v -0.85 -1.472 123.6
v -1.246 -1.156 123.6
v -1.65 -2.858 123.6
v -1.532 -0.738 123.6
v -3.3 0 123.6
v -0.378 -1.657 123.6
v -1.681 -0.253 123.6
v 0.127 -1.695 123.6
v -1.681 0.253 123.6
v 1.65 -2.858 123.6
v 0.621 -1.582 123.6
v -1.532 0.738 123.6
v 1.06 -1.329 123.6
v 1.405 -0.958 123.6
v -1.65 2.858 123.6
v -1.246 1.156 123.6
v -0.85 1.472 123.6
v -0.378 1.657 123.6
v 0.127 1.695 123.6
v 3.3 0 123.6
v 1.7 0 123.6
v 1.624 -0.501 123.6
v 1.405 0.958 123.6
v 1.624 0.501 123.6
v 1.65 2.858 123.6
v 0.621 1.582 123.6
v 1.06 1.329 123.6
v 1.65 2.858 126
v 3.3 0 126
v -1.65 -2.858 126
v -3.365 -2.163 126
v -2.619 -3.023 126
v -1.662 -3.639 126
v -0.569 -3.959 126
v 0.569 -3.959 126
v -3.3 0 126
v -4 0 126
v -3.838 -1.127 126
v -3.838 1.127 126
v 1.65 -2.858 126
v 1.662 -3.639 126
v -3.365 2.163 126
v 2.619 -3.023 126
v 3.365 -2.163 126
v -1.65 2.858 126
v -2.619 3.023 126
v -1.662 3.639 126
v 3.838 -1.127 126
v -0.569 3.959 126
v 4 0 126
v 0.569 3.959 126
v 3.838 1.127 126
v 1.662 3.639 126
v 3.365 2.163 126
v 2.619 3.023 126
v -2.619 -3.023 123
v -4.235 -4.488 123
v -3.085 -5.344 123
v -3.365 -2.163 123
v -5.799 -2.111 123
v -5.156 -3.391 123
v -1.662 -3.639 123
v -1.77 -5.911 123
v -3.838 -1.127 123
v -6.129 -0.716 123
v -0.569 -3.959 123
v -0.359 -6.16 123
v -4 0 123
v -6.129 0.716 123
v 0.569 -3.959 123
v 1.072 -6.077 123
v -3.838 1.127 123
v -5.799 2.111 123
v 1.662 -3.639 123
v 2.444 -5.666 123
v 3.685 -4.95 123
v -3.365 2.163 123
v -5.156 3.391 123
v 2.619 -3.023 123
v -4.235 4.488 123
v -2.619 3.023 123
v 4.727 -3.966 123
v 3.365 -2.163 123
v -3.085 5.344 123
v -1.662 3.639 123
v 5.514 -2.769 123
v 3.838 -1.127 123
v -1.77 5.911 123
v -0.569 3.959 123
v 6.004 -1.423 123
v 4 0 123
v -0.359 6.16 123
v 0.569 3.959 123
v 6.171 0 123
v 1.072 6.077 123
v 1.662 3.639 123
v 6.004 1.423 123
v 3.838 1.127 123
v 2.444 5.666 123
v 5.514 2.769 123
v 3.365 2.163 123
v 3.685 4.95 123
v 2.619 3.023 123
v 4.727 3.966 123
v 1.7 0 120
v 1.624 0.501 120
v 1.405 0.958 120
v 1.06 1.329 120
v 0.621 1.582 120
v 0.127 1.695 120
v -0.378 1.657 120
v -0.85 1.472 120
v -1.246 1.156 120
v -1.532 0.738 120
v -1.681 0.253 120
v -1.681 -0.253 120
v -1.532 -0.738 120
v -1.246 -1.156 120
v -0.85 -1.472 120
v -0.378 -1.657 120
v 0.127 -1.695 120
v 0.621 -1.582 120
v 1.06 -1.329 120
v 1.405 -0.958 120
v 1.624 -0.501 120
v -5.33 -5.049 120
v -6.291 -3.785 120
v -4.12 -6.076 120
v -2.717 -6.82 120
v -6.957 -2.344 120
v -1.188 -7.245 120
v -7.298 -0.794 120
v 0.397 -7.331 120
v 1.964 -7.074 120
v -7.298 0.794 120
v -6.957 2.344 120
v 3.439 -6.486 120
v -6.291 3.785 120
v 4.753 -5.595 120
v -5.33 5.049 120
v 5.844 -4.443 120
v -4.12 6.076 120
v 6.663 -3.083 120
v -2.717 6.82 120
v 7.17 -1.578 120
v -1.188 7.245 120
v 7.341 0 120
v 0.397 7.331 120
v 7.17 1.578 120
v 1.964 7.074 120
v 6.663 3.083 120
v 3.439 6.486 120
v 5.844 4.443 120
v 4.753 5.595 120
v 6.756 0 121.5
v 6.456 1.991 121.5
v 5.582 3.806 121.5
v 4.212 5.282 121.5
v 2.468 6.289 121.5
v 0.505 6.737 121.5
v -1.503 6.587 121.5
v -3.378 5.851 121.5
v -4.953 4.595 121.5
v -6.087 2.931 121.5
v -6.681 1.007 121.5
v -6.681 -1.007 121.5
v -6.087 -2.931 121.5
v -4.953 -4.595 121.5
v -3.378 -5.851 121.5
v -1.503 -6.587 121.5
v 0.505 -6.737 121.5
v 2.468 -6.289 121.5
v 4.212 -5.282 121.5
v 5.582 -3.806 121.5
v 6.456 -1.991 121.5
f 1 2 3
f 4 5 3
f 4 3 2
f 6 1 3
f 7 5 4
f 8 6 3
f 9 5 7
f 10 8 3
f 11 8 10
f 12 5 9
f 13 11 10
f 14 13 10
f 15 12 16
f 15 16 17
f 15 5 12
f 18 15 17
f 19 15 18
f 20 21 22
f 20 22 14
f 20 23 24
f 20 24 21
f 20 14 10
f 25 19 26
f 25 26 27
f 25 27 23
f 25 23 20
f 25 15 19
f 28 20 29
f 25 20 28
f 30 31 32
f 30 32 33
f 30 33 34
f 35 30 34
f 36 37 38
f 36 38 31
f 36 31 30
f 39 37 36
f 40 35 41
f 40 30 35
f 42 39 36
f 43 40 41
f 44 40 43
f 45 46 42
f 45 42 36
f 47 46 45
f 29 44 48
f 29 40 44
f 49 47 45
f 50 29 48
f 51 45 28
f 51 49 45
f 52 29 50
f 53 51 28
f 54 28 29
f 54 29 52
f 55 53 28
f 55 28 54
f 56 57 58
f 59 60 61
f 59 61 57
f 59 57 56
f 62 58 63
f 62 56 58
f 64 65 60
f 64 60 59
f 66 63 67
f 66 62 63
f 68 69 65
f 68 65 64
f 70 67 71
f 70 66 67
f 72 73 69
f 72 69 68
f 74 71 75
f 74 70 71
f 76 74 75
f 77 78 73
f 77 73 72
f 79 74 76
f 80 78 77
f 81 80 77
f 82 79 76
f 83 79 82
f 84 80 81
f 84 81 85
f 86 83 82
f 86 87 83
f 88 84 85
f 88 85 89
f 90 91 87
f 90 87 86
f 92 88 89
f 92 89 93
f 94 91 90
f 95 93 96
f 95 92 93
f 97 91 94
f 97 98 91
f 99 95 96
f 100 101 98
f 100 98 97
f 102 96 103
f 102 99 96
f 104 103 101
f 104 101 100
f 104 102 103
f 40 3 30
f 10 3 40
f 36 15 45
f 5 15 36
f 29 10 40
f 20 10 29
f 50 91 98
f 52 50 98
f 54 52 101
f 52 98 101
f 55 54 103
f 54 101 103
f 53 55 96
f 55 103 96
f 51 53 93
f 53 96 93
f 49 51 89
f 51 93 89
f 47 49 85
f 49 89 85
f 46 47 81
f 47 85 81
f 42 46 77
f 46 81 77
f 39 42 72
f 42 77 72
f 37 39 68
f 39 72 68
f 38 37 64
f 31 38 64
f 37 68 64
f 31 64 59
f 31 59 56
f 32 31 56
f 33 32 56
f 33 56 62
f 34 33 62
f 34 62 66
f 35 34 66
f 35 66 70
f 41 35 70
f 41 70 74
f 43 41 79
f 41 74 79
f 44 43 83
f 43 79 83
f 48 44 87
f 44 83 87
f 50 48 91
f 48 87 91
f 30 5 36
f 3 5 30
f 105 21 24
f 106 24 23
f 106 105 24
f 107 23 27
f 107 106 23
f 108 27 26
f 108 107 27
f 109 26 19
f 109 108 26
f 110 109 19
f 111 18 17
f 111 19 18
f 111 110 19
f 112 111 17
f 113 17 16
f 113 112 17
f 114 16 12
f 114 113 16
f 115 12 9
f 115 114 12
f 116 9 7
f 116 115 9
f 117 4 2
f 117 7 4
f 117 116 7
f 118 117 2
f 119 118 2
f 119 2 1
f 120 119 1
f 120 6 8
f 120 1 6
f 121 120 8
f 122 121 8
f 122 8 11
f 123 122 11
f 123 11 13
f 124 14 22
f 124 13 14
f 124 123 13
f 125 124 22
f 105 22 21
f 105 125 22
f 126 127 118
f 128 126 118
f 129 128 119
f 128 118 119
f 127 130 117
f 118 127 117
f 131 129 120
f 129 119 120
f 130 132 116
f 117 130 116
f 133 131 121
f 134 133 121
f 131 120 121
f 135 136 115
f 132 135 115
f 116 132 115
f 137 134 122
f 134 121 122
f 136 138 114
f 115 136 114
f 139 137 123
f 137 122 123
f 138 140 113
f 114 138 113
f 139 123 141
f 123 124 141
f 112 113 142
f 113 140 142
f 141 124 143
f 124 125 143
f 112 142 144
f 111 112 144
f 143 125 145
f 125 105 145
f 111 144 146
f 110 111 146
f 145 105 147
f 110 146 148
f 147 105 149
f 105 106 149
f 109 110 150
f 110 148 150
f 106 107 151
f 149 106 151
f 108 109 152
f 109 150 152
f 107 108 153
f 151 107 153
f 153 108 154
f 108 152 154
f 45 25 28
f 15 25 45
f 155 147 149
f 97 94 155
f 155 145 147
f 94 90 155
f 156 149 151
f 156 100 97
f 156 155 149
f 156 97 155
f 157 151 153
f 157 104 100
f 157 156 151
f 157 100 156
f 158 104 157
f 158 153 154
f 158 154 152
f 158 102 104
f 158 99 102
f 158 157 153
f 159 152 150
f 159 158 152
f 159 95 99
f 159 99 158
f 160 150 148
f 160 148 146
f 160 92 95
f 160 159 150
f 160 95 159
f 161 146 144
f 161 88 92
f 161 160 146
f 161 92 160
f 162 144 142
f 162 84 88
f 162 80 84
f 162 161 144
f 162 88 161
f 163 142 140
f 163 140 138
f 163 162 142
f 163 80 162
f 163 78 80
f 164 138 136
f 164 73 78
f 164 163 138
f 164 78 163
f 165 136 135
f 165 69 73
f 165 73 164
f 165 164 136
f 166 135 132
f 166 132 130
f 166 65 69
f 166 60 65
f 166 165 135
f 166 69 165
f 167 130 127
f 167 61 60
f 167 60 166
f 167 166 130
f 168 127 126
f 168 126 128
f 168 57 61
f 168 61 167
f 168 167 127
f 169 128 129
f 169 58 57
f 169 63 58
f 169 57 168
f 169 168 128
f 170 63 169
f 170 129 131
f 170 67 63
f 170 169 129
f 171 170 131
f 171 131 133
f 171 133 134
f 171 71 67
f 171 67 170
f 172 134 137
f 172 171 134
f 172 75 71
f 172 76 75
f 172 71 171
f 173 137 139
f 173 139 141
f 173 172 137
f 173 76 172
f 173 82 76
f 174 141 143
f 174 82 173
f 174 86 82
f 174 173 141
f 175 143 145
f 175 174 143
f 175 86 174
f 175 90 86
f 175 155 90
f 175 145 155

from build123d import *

# Parameters (mm, degrees)
CYLINDER396_R     = 1.7
CYLINDER396_DEPTH = 10
PRISM028_DEPTH    = 2.4
CYLINDER402_R     = 8
CYLINDER402_DEPTH = 3
CYLINDER400_R     = 4
CYLINDER400_DEPTH = 3


with BuildPart() as cone006:
    # Cone005 → Cone005 (revolve)
    with BuildSketch(Plane(origin=(0, 0, 85), x_dir=(1, 0, 0), z_dir=(0, -1, 0))):
        Polygon((0, 0), (21, 0), (5, 41), (0, 41), align=None)
    revolve(axis=Axis((0, 0, 85), (0, 0, 1)))


with BuildPart() as cylinder396:
    # Cylinder396 → Cylinder396 (new body)
    with BuildSketch(Plane.XY.offset(120)):
        Circle(CYLINDER396_R)
    extrude(amount=CYLINDER396_DEPTH)


with BuildPart() as fusion075:
    # Prism028 → Prism028 (new body)
    with BuildSketch(Plane.XY.offset(123.6)):
        Polygon((3.3, 0), (1.65, 2.857884), (-1.65, 2.857884), (-3.3, 0), (-1.65, -2.857884), (1.65, -2.857884), align=None)
    extrude(amount=PRISM028_DEPTH)

    # Fusion076: union Cylinder396
    add(cylinder396.part)


with BuildPart() as cylinder402:
    # Cylinder402 → Cylinder402 (new body)
    with BuildSketch(Plane.XY.offset(120)):
        Circle(CYLINDER402_R)
    extrude(amount=CYLINDER402_DEPTH)


with BuildPart() as support_antenna:
    # Cylinder400 → Cylinder400 (new body)
    with BuildSketch(Plane.XY.offset(123)):
        Circle(CYLINDER400_R)
    extrude(amount=CYLINDER400_DEPTH)

    # Fusion078: union Cylinder402
    add(cylinder402.part)

    # Cut210: cut Fusion075
    add(fusion075.part, mode=Mode.SUBTRACT)

    # Common005: intersect Cone006
    add(cone006.part, mode=Mode.INTERSECT)


solid = support_antenna.part
